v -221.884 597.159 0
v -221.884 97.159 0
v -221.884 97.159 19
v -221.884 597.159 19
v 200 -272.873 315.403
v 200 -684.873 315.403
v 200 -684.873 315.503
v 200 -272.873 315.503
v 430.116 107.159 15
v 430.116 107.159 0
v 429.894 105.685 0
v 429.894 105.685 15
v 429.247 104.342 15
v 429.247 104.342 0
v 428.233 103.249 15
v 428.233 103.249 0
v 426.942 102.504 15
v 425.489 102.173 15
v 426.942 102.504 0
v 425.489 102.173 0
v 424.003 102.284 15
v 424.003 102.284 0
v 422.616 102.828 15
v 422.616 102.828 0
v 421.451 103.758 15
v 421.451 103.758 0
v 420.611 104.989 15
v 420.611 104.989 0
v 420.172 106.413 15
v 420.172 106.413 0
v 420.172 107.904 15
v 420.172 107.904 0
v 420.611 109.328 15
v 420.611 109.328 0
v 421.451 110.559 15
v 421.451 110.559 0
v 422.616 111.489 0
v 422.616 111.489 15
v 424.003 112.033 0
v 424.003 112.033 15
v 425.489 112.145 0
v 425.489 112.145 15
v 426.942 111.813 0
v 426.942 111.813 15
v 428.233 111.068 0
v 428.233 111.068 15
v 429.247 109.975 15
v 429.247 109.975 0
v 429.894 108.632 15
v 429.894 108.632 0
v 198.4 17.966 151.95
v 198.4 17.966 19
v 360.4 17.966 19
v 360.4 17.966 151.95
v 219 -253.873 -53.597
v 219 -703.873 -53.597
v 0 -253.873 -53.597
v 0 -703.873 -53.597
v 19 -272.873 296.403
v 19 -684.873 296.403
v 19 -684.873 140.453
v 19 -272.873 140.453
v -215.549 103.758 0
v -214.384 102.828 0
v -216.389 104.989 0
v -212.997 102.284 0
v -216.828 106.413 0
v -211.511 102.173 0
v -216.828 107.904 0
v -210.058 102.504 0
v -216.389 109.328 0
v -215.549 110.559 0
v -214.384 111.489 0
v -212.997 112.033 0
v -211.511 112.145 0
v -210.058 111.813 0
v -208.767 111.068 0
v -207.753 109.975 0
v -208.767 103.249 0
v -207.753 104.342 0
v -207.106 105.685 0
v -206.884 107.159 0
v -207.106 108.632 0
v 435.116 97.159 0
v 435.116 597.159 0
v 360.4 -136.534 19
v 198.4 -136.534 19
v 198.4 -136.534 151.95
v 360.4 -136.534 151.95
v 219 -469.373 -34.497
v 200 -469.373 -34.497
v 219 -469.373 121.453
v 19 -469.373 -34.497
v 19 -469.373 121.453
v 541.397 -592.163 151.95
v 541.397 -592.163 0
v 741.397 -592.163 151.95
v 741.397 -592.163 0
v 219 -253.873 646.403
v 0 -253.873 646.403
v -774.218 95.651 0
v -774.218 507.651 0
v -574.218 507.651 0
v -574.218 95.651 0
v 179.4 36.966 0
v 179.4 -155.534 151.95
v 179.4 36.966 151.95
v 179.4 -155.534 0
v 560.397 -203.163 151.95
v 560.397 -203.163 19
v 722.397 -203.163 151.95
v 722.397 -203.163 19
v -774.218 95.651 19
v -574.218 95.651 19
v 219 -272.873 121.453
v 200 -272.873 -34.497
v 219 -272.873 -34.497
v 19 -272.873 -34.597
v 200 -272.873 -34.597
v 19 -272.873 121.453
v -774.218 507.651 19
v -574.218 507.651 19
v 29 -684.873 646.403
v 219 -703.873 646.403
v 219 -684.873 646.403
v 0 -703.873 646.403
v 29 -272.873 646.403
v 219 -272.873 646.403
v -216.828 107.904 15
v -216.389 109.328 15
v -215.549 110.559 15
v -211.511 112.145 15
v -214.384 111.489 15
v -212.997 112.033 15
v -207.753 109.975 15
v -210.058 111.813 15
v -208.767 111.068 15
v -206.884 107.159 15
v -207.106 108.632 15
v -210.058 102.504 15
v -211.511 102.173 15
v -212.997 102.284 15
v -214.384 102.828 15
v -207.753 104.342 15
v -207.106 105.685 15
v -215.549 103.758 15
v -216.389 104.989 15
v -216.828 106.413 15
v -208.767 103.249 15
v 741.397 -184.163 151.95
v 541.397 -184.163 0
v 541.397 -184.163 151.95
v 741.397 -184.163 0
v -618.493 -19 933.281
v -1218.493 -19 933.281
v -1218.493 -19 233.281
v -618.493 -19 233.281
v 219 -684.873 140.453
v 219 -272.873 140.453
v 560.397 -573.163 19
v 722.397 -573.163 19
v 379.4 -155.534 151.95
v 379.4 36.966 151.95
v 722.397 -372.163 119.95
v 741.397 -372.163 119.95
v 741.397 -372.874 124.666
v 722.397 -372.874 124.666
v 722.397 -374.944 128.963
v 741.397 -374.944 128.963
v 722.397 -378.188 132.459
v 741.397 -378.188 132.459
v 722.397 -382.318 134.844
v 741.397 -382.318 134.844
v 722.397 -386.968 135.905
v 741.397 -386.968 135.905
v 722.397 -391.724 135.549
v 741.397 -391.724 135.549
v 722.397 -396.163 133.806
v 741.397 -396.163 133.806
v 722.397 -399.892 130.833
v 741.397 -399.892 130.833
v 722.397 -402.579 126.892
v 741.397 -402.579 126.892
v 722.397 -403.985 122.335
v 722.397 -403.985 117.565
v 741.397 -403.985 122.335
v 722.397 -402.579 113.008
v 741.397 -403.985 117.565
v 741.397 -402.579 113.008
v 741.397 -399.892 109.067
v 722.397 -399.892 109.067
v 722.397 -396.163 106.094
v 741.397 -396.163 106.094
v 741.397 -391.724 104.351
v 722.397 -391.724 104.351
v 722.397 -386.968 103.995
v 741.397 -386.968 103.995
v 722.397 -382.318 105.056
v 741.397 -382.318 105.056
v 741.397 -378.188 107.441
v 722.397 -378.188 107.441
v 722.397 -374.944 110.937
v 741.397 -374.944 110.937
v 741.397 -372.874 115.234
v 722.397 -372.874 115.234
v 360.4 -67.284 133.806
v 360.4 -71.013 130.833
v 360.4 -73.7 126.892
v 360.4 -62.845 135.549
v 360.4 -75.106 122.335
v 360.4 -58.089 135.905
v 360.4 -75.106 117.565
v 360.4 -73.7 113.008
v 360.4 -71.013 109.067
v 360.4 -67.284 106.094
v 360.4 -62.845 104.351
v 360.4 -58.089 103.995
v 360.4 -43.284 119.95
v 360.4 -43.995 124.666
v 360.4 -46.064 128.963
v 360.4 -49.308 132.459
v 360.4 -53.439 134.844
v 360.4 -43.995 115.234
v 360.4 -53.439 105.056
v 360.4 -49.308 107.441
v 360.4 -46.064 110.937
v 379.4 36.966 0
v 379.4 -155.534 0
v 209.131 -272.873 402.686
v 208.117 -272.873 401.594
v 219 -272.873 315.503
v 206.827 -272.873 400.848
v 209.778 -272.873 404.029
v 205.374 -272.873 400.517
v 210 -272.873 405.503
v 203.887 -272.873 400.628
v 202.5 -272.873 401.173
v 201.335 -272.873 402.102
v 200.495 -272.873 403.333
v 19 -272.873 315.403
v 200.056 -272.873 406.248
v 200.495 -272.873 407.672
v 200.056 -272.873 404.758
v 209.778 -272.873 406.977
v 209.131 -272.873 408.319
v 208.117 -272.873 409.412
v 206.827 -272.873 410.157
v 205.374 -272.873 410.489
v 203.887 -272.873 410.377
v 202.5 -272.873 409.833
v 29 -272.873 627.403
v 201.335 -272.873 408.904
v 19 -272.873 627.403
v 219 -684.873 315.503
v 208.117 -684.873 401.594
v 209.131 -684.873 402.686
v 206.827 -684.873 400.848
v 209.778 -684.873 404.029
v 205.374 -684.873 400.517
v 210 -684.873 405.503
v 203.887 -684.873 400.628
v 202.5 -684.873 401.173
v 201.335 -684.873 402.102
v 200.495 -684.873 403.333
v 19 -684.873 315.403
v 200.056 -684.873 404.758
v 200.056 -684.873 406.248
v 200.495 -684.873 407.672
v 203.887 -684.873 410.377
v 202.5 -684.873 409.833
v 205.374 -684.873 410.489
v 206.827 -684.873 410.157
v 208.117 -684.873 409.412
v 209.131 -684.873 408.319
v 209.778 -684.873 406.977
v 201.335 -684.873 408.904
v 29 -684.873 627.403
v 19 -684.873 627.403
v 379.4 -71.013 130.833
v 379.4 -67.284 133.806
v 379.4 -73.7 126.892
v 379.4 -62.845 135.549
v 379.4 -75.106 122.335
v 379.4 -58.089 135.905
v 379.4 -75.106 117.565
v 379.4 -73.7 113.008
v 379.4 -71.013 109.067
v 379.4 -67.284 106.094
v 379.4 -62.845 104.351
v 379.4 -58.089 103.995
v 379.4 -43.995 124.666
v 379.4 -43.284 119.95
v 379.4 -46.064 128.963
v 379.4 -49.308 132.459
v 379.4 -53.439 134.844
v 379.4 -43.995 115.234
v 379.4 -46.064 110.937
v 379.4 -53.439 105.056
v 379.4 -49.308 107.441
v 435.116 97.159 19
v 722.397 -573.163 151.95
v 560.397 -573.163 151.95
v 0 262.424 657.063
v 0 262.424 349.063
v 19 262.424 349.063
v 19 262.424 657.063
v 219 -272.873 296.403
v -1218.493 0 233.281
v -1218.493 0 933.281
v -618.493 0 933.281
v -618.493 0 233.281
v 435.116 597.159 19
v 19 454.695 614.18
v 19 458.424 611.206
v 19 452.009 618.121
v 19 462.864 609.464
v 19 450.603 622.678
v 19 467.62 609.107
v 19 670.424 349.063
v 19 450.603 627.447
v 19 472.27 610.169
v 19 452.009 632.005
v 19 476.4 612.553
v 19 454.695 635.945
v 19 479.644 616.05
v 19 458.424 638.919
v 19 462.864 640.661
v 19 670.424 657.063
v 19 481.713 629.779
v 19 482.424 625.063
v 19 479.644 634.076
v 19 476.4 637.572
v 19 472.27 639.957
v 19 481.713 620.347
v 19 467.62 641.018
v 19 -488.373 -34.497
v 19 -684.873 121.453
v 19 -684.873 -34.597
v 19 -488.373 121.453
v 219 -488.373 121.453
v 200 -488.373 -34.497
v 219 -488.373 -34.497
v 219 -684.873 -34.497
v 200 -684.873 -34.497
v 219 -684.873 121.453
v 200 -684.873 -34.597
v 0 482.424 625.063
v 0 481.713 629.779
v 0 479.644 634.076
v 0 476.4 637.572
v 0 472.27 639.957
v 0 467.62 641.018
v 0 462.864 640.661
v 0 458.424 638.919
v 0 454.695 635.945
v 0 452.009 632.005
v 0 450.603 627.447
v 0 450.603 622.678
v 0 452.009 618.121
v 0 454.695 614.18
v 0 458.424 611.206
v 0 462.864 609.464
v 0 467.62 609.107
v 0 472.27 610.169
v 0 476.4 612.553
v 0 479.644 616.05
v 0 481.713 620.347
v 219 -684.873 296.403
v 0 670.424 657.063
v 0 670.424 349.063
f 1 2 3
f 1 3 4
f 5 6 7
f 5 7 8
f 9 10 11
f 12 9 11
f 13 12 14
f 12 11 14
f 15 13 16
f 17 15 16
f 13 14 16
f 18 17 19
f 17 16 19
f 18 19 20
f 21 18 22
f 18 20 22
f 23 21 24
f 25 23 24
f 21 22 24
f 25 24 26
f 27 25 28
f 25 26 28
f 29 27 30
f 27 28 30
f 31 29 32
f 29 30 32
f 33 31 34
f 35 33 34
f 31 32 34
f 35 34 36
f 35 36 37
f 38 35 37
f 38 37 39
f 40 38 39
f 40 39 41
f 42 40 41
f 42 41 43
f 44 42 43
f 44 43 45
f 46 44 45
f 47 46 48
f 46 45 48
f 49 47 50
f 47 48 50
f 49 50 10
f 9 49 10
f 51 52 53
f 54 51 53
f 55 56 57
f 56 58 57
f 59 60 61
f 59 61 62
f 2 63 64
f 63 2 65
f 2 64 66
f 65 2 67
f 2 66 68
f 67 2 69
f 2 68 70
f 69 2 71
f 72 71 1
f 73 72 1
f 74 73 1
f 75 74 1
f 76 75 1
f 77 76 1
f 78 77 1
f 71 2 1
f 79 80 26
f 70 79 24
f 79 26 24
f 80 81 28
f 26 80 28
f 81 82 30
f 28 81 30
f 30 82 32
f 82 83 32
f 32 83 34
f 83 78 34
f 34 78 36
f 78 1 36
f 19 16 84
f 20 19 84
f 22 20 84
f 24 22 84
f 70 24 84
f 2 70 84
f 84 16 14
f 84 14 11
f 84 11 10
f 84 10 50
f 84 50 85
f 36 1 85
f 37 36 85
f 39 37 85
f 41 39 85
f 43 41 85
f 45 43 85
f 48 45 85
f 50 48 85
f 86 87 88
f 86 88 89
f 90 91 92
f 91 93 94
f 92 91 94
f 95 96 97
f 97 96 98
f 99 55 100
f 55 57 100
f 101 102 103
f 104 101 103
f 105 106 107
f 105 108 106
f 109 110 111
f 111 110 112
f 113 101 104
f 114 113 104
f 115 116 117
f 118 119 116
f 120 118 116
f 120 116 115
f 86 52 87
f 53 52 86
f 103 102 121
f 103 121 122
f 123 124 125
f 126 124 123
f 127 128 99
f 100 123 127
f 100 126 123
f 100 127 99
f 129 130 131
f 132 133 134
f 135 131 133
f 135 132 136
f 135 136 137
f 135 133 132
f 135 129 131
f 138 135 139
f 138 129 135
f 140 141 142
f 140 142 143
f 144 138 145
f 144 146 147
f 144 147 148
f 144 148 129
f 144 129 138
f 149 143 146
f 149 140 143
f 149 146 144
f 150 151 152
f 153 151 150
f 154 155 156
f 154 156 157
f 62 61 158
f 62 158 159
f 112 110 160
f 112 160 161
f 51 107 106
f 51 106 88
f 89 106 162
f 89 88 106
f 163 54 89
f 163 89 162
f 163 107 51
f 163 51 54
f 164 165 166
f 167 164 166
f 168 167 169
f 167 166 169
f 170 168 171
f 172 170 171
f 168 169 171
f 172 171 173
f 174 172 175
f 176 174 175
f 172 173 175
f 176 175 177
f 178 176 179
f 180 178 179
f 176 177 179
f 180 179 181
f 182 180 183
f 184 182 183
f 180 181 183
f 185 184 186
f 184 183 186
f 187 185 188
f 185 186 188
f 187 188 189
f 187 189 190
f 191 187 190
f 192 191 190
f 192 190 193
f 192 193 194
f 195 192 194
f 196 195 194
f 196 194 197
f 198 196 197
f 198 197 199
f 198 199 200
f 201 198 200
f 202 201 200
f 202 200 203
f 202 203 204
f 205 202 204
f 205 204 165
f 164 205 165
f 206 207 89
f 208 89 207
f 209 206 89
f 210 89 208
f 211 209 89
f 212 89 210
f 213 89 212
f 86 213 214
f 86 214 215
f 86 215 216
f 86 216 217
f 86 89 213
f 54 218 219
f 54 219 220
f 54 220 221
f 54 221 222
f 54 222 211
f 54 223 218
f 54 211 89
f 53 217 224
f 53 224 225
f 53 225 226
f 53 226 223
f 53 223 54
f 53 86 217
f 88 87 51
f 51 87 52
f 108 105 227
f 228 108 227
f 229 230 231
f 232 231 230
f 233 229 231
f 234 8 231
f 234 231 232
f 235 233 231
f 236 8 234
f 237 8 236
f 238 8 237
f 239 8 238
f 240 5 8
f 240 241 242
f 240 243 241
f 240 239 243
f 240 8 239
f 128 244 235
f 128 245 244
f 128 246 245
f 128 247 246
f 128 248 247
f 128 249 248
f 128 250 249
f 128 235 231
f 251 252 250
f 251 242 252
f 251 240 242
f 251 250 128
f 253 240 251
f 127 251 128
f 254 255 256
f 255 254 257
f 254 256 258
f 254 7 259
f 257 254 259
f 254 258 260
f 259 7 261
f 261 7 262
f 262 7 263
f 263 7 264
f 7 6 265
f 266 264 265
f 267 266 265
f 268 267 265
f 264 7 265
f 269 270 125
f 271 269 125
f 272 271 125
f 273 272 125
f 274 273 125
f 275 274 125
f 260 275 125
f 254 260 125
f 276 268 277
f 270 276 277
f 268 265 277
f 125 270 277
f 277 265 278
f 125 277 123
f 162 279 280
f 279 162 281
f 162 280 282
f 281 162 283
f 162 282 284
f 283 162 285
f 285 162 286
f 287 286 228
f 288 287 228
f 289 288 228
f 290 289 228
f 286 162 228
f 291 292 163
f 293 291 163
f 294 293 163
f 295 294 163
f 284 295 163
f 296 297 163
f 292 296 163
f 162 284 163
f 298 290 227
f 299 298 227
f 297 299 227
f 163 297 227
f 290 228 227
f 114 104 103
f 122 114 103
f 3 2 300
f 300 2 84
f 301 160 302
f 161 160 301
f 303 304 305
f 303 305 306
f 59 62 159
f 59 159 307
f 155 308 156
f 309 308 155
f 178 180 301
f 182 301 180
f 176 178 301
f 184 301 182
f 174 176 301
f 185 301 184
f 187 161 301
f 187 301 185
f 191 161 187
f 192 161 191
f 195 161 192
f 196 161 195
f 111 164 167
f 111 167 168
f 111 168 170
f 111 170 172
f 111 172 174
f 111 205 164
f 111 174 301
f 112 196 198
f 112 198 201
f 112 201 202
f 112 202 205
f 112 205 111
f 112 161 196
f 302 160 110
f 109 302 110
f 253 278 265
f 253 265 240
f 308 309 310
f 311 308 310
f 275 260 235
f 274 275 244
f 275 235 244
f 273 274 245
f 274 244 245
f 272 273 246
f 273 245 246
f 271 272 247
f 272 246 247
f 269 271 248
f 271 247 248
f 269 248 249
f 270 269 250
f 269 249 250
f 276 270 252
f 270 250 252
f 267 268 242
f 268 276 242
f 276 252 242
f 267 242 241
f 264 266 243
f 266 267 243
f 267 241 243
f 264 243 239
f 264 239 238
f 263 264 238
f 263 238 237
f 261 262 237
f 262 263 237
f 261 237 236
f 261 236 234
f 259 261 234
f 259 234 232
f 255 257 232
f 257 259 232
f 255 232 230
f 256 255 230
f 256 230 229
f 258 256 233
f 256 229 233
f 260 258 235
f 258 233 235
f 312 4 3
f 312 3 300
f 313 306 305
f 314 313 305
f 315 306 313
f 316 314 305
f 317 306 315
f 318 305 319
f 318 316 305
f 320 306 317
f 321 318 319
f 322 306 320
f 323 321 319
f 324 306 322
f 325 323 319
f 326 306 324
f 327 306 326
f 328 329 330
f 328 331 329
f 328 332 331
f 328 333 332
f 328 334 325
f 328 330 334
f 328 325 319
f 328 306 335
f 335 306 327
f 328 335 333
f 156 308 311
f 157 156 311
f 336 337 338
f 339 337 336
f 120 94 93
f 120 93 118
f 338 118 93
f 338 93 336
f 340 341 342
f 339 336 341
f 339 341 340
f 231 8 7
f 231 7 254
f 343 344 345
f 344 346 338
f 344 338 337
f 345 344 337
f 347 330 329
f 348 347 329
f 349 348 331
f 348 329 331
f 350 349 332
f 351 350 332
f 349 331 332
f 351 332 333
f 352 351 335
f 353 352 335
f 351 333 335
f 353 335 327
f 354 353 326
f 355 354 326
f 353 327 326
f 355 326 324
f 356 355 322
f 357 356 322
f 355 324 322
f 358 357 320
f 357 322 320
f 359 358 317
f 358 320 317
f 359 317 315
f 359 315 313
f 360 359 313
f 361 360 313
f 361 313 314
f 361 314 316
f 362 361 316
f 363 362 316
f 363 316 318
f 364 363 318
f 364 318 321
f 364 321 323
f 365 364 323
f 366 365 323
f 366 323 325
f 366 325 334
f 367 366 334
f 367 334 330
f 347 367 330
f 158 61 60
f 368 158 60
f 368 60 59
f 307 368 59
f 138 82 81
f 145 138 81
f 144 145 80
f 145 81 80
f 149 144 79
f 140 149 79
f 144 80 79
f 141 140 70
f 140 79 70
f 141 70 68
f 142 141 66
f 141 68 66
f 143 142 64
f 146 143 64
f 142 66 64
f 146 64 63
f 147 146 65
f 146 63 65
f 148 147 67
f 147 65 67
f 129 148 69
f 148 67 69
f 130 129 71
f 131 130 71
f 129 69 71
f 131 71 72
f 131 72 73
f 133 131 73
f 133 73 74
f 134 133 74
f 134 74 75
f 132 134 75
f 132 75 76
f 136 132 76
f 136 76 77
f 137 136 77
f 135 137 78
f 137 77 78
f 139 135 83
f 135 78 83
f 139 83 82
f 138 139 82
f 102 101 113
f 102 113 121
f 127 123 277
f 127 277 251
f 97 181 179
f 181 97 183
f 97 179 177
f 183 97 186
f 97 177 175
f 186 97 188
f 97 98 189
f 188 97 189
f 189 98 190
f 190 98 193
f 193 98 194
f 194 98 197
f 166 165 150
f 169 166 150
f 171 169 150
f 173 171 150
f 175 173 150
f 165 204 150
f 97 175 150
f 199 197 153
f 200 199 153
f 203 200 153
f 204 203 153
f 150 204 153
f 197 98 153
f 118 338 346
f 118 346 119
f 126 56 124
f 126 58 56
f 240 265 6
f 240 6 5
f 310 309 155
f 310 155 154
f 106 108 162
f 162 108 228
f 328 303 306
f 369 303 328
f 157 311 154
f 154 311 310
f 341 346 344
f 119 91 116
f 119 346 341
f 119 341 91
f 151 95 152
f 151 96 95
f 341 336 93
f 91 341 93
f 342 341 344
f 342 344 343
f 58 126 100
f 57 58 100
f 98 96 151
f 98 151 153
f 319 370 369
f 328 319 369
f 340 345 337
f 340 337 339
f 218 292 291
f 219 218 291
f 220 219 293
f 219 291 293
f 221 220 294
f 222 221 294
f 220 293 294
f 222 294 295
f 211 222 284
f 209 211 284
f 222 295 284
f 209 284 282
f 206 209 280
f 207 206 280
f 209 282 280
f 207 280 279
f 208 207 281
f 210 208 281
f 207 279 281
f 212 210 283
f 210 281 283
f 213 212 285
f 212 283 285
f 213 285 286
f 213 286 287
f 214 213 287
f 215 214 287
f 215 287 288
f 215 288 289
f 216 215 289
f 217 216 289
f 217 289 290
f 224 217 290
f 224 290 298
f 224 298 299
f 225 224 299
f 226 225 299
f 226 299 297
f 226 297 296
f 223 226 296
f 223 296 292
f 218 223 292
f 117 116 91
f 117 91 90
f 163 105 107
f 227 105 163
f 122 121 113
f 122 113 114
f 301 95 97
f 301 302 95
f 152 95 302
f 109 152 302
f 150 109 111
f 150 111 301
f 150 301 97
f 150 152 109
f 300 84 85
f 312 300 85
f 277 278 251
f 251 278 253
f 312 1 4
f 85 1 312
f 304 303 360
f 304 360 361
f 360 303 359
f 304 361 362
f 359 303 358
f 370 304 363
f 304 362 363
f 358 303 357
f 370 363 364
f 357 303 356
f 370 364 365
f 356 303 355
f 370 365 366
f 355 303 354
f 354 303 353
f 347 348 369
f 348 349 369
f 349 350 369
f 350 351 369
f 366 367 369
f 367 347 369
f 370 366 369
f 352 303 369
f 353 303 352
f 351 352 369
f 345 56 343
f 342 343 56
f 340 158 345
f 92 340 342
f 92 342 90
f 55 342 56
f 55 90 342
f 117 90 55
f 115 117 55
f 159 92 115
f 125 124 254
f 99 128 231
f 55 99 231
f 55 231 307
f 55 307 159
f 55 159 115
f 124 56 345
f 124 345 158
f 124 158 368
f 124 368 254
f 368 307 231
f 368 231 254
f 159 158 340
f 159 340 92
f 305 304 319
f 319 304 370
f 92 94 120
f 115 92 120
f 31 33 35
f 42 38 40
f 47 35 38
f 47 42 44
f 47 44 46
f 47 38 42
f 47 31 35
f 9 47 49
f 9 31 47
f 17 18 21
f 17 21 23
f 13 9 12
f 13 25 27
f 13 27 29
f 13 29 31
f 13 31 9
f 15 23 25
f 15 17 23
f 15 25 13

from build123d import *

# Parameters (mm, degrees)
F0_W      = 450
F0_H      = 700
F1_DEPTH  = 19
F2_W      = 19
F2_H      = 700
F3_DEPTH  = 200
F4_W      = 19
F4_H      = 700
F5_DEPTH  = 200
F6_W      = 412
F6_H      = 19
F7_DEPTH  = 10
F8_W      = 412
F8_H      = 19
F9_DEPTH  = 200
F10_W     = 19
F10_H     = 412
F11_DEPTH = 0.1
F12_W     = 412
F12_H     = 19
F13_DEPTH = 200
F14_W     = 19
F14_H     = 412
F15_DEPTH = 0.1
F16_W     = 657
F16_H     = 500
F17_DEPTH = 19
F18_W     = 600
F18_H     = 700
F19_DEPTH = 19
F20_R     = 5
F21_DEPTH = 15
F22_R     = 5
F23_DEPTH = 15
F24_R     = 5
F25_DEPTH = 15
F26_R     = 5
F27_DEPTH = 15
F28_R     = 5
F29_DEPTH = 430
F30_W     = 412
F30_H     = 19
F31_DEPTH = 200
F32_W     = 19
F32_H     = 174.95
F33_DEPTH = 200
F34_W     = 200
F34_H     = 192.5
F35_DEPTH = 19
F36_W     = 200
F36_H     = 192.5
F36_W_2   = 162
F36_H_2   = 154.5
F37_DEPTH = 132.95
F38_R     = 16
F39_DEPTH = 25
F40_W     = 200
F40_H     = 408
F41_DEPTH = 19
F42_W     = 200
F42_H     = 408
F42_W_2   = 162
F42_H_2   = 370
F43_DEPTH = 132.95
F44_R     = 16
F45_DEPTH = 25
F46_W     = 408
F46_H     = 308
F47_DEPTH = 19
F48_R     = 16
F49_DEPTH = 25
F50_W     = 200
F50_H     = 412
F51_DEPTH = 19


with BuildPart() as f1:
    # F0 (on Right) → F1 (new body)
    with BuildSketch(Plane.YZ):
        with Locations((-478.8726508617, 296.4027918875)):
            Rectangle(F0_W, F0_H)
    extrude(amount=F1_DEPTH)

    # F2 (on face) → F3 (join)
    with BuildSketch(Plane.YZ.offset(19)):
        with Locations((-694.3726508617, 296.4027918875)):
            Rectangle(F2_W, F2_H)
    extrude(amount=F3_DEPTH)

    # F4 (on face) → F5 (join)
    with BuildSketch(Plane.YZ.offset(19)):
        with Locations((-263.3726508617, 296.4027918875)):
            Rectangle(F4_W, F4_H)
    extrude(amount=F5_DEPTH)

    # F6 (on face) → F7 (join)
    with BuildSketch(Plane.YZ.offset(19)):
        with Locations((-478.8726508617, 636.9027918875)):
            Rectangle(F6_W, F6_H)
    extrude(amount=F7_DEPTH)

    # F8 (on face) → F9 (join)
    with BuildSketch(Plane.YZ.offset(19)):
        with Locations((-478.8726508617, -44.0972081125)):
            Rectangle(F8_W, F8_H)
    extrude(amount=F9_DEPTH)

    # F10 (on face) → F11 (join)
    with BuildSketch(Plane.XY.offset(-34.5972081125)):
        with Locations((209.5, -478.8726508617)):
            Rectangle(F10_W, F10_H)
    extrude(amount=F11_DEPTH)

    # F12 (on face) → F13 (join)
    with BuildSketch(Plane.YZ.offset(19)):
        with Locations((-478.8726508617, 305.9027918875)):
            Rectangle(F12_W, F12_H)
    extrude(amount=F13_DEPTH)

    # F14 (on face) → F15 (join)
    with BuildSketch(Plane.XY.offset(315.4027918875)):
        with Locations((209.5, -478.8726508617)):
            Rectangle(F14_W, F14_H)
    extrude(amount=F15_DEPTH)

    # F20 (on face) → F21 (cut)
    with BuildSketch(Plane.XY.offset(646.4027918875)):
        with Locations((169, -303.8726508617)):
            Circle(F20_R)
    extrude(amount=-F21_DEPTH, mode=Mode.SUBTRACT)

    # F24 (on face) → F25 (cut)
    with BuildSketch(Plane.XY.offset(646.4027918875)):
        with Locations((169, -653.8726508617)):
            Circle(F24_R)
    extrude(amount=-F25_DEPTH, mode=Mode.SUBTRACT)

    # F28 (on face) → F29 (join)
    with BuildSketch(Plane.XZ.offset(272.8726508617)):
        with Locations((205, 405.5027918875)):
            Circle(F28_R)
    extrude(amount=F29_DEPTH)

    # F30 (on face) → F31 (join)
    with BuildSketch(Plane.YZ.offset(19)):
        with Locations((-478.8726508617, 130.9527918875)):
            Rectangle(F30_W, F30_H)
    extrude(amount=F31_DEPTH)

    # F32 (on face) → F33 (join)
    with BuildSketch(Plane.YZ.offset(19)):
        with Locations((-478.8726508617, 52.9777918875)):
            Rectangle(F32_W, F32_H)
    extrude(amount=F33_DEPTH)


with BuildPart() as f17:
    # F16 (on Top) → F17 (new body)
    with BuildSketch(Plane.XY):
        with Locations((106.6157940626, 347.1586033702)):
            Rectangle(F16_W, F16_H)
    extrude(amount=F17_DEPTH)

    # F22 (on face) → F23 (cut)
    with BuildSketch(Plane(origin=(0, 0, 0), x_dir=(1, 0, 0), z_dir=(0, 0, -1))):
        with Locations((425.1157940626, -107.1586033702)):
            Circle(F22_R)
    extrude(amount=-F23_DEPTH, mode=Mode.SUBTRACT)

    # F26 (on face) → F27 (cut)
    with BuildSketch(Plane(origin=(0, 0, 0), x_dir=(1, 0, 0), z_dir=(0, 0, -1))):
        with Locations((-211.8842059374, -107.1586033702)):
            Circle(F26_R)
    extrude(amount=-F27_DEPTH, mode=Mode.SUBTRACT)


with BuildPart() as f19:
    # F18 (on Front) → F19 (new body)
    with BuildSketch(Plane.XZ):
        with Locations((-918.4927225113, 583.2810461521)):
            Rectangle(F18_W, F18_H)
    extrude(amount=F19_DEPTH)


with BuildPart() as f35:
    # F34 (on Top) → F35 (new body)
    with BuildSketch(Plane.XY):
        with Locations((279.4003725052, -59.2842972279)):
            Rectangle(F34_W, F34_H)
    extrude(amount=F35_DEPTH)

    # F36 (on face) → F37 (join)
    with BuildSketch(Plane.XY.offset(19)):
        with Locations((279.4003725052, -59.2842972279)):
            Rectangle(F36_W, F36_H)
        with Locations((279.4003725052, -59.2842972279)):
            Rectangle(F36_W_2, F36_H_2, mode=Mode.SUBTRACT)
    extrude(amount=F37_DEPTH)

    # F38 (on face) → F39 (cut)
    with BuildSketch(Plane.YZ.offset(379.4003725052)):
        with Locations((-59.2842972279, 119.95)):
            Circle(F38_R)
    extrude(amount=-F39_DEPTH, mode=Mode.SUBTRACT)


with BuildPart() as f41:
    # F40 (on Top) → F41 (new body)
    with BuildSketch(Plane.XY):
        with Locations((641.397023201, -388.1634435654)):
            Rectangle(F40_W, F40_H)
    extrude(amount=F41_DEPTH)

    # F42 (on face) → F43 (join)
    with BuildSketch(Plane.XY.offset(19)):
        with Locations((641.397023201, -388.1634435654)):
            Rectangle(F42_W, F42_H)
        with Locations((641.397023201, -388.1634435654)):
            Rectangle(F42_W_2, F42_H_2, mode=Mode.SUBTRACT)
    extrude(amount=F43_DEPTH)

    # F44 (on face) → F45 (cut)
    with BuildSketch(Plane.YZ.offset(741.397023201)):
        with Locations((-388.1634435654, 119.95)):
            Circle(F44_R)
    extrude(amount=-F45_DEPTH, mode=Mode.SUBTRACT)


with BuildPart() as f47:
    # F46 (on Right) → F47 (new body)
    with BuildSketch(Plane.YZ):
        with Locations((466.4241037369, 503.0626513958)):
            Rectangle(F46_W, F46_H)
    extrude(amount=F47_DEPTH)

    # F48 (on face) → F49 (cut)
    with BuildSketch(Plane.YZ.offset(19)):
        with Locations((466.4241037369, 625.0626513958)):
            Circle(F48_R)
    extrude(amount=-F49_DEPTH, mode=Mode.SUBTRACT)


with BuildPart() as f51:
    # F50 (on Top) → F51 (new body)
    with BuildSketch(Plane.XY):
        with Locations((-674.2177963257, 301.6512093544)):
            Rectangle(F50_W, F50_H)
    extrude(amount=F51_DEPTH)


solid = Compound([f1.part, f17.part, f19.part, f35.part, f41.part, f47.part, f51.part])
